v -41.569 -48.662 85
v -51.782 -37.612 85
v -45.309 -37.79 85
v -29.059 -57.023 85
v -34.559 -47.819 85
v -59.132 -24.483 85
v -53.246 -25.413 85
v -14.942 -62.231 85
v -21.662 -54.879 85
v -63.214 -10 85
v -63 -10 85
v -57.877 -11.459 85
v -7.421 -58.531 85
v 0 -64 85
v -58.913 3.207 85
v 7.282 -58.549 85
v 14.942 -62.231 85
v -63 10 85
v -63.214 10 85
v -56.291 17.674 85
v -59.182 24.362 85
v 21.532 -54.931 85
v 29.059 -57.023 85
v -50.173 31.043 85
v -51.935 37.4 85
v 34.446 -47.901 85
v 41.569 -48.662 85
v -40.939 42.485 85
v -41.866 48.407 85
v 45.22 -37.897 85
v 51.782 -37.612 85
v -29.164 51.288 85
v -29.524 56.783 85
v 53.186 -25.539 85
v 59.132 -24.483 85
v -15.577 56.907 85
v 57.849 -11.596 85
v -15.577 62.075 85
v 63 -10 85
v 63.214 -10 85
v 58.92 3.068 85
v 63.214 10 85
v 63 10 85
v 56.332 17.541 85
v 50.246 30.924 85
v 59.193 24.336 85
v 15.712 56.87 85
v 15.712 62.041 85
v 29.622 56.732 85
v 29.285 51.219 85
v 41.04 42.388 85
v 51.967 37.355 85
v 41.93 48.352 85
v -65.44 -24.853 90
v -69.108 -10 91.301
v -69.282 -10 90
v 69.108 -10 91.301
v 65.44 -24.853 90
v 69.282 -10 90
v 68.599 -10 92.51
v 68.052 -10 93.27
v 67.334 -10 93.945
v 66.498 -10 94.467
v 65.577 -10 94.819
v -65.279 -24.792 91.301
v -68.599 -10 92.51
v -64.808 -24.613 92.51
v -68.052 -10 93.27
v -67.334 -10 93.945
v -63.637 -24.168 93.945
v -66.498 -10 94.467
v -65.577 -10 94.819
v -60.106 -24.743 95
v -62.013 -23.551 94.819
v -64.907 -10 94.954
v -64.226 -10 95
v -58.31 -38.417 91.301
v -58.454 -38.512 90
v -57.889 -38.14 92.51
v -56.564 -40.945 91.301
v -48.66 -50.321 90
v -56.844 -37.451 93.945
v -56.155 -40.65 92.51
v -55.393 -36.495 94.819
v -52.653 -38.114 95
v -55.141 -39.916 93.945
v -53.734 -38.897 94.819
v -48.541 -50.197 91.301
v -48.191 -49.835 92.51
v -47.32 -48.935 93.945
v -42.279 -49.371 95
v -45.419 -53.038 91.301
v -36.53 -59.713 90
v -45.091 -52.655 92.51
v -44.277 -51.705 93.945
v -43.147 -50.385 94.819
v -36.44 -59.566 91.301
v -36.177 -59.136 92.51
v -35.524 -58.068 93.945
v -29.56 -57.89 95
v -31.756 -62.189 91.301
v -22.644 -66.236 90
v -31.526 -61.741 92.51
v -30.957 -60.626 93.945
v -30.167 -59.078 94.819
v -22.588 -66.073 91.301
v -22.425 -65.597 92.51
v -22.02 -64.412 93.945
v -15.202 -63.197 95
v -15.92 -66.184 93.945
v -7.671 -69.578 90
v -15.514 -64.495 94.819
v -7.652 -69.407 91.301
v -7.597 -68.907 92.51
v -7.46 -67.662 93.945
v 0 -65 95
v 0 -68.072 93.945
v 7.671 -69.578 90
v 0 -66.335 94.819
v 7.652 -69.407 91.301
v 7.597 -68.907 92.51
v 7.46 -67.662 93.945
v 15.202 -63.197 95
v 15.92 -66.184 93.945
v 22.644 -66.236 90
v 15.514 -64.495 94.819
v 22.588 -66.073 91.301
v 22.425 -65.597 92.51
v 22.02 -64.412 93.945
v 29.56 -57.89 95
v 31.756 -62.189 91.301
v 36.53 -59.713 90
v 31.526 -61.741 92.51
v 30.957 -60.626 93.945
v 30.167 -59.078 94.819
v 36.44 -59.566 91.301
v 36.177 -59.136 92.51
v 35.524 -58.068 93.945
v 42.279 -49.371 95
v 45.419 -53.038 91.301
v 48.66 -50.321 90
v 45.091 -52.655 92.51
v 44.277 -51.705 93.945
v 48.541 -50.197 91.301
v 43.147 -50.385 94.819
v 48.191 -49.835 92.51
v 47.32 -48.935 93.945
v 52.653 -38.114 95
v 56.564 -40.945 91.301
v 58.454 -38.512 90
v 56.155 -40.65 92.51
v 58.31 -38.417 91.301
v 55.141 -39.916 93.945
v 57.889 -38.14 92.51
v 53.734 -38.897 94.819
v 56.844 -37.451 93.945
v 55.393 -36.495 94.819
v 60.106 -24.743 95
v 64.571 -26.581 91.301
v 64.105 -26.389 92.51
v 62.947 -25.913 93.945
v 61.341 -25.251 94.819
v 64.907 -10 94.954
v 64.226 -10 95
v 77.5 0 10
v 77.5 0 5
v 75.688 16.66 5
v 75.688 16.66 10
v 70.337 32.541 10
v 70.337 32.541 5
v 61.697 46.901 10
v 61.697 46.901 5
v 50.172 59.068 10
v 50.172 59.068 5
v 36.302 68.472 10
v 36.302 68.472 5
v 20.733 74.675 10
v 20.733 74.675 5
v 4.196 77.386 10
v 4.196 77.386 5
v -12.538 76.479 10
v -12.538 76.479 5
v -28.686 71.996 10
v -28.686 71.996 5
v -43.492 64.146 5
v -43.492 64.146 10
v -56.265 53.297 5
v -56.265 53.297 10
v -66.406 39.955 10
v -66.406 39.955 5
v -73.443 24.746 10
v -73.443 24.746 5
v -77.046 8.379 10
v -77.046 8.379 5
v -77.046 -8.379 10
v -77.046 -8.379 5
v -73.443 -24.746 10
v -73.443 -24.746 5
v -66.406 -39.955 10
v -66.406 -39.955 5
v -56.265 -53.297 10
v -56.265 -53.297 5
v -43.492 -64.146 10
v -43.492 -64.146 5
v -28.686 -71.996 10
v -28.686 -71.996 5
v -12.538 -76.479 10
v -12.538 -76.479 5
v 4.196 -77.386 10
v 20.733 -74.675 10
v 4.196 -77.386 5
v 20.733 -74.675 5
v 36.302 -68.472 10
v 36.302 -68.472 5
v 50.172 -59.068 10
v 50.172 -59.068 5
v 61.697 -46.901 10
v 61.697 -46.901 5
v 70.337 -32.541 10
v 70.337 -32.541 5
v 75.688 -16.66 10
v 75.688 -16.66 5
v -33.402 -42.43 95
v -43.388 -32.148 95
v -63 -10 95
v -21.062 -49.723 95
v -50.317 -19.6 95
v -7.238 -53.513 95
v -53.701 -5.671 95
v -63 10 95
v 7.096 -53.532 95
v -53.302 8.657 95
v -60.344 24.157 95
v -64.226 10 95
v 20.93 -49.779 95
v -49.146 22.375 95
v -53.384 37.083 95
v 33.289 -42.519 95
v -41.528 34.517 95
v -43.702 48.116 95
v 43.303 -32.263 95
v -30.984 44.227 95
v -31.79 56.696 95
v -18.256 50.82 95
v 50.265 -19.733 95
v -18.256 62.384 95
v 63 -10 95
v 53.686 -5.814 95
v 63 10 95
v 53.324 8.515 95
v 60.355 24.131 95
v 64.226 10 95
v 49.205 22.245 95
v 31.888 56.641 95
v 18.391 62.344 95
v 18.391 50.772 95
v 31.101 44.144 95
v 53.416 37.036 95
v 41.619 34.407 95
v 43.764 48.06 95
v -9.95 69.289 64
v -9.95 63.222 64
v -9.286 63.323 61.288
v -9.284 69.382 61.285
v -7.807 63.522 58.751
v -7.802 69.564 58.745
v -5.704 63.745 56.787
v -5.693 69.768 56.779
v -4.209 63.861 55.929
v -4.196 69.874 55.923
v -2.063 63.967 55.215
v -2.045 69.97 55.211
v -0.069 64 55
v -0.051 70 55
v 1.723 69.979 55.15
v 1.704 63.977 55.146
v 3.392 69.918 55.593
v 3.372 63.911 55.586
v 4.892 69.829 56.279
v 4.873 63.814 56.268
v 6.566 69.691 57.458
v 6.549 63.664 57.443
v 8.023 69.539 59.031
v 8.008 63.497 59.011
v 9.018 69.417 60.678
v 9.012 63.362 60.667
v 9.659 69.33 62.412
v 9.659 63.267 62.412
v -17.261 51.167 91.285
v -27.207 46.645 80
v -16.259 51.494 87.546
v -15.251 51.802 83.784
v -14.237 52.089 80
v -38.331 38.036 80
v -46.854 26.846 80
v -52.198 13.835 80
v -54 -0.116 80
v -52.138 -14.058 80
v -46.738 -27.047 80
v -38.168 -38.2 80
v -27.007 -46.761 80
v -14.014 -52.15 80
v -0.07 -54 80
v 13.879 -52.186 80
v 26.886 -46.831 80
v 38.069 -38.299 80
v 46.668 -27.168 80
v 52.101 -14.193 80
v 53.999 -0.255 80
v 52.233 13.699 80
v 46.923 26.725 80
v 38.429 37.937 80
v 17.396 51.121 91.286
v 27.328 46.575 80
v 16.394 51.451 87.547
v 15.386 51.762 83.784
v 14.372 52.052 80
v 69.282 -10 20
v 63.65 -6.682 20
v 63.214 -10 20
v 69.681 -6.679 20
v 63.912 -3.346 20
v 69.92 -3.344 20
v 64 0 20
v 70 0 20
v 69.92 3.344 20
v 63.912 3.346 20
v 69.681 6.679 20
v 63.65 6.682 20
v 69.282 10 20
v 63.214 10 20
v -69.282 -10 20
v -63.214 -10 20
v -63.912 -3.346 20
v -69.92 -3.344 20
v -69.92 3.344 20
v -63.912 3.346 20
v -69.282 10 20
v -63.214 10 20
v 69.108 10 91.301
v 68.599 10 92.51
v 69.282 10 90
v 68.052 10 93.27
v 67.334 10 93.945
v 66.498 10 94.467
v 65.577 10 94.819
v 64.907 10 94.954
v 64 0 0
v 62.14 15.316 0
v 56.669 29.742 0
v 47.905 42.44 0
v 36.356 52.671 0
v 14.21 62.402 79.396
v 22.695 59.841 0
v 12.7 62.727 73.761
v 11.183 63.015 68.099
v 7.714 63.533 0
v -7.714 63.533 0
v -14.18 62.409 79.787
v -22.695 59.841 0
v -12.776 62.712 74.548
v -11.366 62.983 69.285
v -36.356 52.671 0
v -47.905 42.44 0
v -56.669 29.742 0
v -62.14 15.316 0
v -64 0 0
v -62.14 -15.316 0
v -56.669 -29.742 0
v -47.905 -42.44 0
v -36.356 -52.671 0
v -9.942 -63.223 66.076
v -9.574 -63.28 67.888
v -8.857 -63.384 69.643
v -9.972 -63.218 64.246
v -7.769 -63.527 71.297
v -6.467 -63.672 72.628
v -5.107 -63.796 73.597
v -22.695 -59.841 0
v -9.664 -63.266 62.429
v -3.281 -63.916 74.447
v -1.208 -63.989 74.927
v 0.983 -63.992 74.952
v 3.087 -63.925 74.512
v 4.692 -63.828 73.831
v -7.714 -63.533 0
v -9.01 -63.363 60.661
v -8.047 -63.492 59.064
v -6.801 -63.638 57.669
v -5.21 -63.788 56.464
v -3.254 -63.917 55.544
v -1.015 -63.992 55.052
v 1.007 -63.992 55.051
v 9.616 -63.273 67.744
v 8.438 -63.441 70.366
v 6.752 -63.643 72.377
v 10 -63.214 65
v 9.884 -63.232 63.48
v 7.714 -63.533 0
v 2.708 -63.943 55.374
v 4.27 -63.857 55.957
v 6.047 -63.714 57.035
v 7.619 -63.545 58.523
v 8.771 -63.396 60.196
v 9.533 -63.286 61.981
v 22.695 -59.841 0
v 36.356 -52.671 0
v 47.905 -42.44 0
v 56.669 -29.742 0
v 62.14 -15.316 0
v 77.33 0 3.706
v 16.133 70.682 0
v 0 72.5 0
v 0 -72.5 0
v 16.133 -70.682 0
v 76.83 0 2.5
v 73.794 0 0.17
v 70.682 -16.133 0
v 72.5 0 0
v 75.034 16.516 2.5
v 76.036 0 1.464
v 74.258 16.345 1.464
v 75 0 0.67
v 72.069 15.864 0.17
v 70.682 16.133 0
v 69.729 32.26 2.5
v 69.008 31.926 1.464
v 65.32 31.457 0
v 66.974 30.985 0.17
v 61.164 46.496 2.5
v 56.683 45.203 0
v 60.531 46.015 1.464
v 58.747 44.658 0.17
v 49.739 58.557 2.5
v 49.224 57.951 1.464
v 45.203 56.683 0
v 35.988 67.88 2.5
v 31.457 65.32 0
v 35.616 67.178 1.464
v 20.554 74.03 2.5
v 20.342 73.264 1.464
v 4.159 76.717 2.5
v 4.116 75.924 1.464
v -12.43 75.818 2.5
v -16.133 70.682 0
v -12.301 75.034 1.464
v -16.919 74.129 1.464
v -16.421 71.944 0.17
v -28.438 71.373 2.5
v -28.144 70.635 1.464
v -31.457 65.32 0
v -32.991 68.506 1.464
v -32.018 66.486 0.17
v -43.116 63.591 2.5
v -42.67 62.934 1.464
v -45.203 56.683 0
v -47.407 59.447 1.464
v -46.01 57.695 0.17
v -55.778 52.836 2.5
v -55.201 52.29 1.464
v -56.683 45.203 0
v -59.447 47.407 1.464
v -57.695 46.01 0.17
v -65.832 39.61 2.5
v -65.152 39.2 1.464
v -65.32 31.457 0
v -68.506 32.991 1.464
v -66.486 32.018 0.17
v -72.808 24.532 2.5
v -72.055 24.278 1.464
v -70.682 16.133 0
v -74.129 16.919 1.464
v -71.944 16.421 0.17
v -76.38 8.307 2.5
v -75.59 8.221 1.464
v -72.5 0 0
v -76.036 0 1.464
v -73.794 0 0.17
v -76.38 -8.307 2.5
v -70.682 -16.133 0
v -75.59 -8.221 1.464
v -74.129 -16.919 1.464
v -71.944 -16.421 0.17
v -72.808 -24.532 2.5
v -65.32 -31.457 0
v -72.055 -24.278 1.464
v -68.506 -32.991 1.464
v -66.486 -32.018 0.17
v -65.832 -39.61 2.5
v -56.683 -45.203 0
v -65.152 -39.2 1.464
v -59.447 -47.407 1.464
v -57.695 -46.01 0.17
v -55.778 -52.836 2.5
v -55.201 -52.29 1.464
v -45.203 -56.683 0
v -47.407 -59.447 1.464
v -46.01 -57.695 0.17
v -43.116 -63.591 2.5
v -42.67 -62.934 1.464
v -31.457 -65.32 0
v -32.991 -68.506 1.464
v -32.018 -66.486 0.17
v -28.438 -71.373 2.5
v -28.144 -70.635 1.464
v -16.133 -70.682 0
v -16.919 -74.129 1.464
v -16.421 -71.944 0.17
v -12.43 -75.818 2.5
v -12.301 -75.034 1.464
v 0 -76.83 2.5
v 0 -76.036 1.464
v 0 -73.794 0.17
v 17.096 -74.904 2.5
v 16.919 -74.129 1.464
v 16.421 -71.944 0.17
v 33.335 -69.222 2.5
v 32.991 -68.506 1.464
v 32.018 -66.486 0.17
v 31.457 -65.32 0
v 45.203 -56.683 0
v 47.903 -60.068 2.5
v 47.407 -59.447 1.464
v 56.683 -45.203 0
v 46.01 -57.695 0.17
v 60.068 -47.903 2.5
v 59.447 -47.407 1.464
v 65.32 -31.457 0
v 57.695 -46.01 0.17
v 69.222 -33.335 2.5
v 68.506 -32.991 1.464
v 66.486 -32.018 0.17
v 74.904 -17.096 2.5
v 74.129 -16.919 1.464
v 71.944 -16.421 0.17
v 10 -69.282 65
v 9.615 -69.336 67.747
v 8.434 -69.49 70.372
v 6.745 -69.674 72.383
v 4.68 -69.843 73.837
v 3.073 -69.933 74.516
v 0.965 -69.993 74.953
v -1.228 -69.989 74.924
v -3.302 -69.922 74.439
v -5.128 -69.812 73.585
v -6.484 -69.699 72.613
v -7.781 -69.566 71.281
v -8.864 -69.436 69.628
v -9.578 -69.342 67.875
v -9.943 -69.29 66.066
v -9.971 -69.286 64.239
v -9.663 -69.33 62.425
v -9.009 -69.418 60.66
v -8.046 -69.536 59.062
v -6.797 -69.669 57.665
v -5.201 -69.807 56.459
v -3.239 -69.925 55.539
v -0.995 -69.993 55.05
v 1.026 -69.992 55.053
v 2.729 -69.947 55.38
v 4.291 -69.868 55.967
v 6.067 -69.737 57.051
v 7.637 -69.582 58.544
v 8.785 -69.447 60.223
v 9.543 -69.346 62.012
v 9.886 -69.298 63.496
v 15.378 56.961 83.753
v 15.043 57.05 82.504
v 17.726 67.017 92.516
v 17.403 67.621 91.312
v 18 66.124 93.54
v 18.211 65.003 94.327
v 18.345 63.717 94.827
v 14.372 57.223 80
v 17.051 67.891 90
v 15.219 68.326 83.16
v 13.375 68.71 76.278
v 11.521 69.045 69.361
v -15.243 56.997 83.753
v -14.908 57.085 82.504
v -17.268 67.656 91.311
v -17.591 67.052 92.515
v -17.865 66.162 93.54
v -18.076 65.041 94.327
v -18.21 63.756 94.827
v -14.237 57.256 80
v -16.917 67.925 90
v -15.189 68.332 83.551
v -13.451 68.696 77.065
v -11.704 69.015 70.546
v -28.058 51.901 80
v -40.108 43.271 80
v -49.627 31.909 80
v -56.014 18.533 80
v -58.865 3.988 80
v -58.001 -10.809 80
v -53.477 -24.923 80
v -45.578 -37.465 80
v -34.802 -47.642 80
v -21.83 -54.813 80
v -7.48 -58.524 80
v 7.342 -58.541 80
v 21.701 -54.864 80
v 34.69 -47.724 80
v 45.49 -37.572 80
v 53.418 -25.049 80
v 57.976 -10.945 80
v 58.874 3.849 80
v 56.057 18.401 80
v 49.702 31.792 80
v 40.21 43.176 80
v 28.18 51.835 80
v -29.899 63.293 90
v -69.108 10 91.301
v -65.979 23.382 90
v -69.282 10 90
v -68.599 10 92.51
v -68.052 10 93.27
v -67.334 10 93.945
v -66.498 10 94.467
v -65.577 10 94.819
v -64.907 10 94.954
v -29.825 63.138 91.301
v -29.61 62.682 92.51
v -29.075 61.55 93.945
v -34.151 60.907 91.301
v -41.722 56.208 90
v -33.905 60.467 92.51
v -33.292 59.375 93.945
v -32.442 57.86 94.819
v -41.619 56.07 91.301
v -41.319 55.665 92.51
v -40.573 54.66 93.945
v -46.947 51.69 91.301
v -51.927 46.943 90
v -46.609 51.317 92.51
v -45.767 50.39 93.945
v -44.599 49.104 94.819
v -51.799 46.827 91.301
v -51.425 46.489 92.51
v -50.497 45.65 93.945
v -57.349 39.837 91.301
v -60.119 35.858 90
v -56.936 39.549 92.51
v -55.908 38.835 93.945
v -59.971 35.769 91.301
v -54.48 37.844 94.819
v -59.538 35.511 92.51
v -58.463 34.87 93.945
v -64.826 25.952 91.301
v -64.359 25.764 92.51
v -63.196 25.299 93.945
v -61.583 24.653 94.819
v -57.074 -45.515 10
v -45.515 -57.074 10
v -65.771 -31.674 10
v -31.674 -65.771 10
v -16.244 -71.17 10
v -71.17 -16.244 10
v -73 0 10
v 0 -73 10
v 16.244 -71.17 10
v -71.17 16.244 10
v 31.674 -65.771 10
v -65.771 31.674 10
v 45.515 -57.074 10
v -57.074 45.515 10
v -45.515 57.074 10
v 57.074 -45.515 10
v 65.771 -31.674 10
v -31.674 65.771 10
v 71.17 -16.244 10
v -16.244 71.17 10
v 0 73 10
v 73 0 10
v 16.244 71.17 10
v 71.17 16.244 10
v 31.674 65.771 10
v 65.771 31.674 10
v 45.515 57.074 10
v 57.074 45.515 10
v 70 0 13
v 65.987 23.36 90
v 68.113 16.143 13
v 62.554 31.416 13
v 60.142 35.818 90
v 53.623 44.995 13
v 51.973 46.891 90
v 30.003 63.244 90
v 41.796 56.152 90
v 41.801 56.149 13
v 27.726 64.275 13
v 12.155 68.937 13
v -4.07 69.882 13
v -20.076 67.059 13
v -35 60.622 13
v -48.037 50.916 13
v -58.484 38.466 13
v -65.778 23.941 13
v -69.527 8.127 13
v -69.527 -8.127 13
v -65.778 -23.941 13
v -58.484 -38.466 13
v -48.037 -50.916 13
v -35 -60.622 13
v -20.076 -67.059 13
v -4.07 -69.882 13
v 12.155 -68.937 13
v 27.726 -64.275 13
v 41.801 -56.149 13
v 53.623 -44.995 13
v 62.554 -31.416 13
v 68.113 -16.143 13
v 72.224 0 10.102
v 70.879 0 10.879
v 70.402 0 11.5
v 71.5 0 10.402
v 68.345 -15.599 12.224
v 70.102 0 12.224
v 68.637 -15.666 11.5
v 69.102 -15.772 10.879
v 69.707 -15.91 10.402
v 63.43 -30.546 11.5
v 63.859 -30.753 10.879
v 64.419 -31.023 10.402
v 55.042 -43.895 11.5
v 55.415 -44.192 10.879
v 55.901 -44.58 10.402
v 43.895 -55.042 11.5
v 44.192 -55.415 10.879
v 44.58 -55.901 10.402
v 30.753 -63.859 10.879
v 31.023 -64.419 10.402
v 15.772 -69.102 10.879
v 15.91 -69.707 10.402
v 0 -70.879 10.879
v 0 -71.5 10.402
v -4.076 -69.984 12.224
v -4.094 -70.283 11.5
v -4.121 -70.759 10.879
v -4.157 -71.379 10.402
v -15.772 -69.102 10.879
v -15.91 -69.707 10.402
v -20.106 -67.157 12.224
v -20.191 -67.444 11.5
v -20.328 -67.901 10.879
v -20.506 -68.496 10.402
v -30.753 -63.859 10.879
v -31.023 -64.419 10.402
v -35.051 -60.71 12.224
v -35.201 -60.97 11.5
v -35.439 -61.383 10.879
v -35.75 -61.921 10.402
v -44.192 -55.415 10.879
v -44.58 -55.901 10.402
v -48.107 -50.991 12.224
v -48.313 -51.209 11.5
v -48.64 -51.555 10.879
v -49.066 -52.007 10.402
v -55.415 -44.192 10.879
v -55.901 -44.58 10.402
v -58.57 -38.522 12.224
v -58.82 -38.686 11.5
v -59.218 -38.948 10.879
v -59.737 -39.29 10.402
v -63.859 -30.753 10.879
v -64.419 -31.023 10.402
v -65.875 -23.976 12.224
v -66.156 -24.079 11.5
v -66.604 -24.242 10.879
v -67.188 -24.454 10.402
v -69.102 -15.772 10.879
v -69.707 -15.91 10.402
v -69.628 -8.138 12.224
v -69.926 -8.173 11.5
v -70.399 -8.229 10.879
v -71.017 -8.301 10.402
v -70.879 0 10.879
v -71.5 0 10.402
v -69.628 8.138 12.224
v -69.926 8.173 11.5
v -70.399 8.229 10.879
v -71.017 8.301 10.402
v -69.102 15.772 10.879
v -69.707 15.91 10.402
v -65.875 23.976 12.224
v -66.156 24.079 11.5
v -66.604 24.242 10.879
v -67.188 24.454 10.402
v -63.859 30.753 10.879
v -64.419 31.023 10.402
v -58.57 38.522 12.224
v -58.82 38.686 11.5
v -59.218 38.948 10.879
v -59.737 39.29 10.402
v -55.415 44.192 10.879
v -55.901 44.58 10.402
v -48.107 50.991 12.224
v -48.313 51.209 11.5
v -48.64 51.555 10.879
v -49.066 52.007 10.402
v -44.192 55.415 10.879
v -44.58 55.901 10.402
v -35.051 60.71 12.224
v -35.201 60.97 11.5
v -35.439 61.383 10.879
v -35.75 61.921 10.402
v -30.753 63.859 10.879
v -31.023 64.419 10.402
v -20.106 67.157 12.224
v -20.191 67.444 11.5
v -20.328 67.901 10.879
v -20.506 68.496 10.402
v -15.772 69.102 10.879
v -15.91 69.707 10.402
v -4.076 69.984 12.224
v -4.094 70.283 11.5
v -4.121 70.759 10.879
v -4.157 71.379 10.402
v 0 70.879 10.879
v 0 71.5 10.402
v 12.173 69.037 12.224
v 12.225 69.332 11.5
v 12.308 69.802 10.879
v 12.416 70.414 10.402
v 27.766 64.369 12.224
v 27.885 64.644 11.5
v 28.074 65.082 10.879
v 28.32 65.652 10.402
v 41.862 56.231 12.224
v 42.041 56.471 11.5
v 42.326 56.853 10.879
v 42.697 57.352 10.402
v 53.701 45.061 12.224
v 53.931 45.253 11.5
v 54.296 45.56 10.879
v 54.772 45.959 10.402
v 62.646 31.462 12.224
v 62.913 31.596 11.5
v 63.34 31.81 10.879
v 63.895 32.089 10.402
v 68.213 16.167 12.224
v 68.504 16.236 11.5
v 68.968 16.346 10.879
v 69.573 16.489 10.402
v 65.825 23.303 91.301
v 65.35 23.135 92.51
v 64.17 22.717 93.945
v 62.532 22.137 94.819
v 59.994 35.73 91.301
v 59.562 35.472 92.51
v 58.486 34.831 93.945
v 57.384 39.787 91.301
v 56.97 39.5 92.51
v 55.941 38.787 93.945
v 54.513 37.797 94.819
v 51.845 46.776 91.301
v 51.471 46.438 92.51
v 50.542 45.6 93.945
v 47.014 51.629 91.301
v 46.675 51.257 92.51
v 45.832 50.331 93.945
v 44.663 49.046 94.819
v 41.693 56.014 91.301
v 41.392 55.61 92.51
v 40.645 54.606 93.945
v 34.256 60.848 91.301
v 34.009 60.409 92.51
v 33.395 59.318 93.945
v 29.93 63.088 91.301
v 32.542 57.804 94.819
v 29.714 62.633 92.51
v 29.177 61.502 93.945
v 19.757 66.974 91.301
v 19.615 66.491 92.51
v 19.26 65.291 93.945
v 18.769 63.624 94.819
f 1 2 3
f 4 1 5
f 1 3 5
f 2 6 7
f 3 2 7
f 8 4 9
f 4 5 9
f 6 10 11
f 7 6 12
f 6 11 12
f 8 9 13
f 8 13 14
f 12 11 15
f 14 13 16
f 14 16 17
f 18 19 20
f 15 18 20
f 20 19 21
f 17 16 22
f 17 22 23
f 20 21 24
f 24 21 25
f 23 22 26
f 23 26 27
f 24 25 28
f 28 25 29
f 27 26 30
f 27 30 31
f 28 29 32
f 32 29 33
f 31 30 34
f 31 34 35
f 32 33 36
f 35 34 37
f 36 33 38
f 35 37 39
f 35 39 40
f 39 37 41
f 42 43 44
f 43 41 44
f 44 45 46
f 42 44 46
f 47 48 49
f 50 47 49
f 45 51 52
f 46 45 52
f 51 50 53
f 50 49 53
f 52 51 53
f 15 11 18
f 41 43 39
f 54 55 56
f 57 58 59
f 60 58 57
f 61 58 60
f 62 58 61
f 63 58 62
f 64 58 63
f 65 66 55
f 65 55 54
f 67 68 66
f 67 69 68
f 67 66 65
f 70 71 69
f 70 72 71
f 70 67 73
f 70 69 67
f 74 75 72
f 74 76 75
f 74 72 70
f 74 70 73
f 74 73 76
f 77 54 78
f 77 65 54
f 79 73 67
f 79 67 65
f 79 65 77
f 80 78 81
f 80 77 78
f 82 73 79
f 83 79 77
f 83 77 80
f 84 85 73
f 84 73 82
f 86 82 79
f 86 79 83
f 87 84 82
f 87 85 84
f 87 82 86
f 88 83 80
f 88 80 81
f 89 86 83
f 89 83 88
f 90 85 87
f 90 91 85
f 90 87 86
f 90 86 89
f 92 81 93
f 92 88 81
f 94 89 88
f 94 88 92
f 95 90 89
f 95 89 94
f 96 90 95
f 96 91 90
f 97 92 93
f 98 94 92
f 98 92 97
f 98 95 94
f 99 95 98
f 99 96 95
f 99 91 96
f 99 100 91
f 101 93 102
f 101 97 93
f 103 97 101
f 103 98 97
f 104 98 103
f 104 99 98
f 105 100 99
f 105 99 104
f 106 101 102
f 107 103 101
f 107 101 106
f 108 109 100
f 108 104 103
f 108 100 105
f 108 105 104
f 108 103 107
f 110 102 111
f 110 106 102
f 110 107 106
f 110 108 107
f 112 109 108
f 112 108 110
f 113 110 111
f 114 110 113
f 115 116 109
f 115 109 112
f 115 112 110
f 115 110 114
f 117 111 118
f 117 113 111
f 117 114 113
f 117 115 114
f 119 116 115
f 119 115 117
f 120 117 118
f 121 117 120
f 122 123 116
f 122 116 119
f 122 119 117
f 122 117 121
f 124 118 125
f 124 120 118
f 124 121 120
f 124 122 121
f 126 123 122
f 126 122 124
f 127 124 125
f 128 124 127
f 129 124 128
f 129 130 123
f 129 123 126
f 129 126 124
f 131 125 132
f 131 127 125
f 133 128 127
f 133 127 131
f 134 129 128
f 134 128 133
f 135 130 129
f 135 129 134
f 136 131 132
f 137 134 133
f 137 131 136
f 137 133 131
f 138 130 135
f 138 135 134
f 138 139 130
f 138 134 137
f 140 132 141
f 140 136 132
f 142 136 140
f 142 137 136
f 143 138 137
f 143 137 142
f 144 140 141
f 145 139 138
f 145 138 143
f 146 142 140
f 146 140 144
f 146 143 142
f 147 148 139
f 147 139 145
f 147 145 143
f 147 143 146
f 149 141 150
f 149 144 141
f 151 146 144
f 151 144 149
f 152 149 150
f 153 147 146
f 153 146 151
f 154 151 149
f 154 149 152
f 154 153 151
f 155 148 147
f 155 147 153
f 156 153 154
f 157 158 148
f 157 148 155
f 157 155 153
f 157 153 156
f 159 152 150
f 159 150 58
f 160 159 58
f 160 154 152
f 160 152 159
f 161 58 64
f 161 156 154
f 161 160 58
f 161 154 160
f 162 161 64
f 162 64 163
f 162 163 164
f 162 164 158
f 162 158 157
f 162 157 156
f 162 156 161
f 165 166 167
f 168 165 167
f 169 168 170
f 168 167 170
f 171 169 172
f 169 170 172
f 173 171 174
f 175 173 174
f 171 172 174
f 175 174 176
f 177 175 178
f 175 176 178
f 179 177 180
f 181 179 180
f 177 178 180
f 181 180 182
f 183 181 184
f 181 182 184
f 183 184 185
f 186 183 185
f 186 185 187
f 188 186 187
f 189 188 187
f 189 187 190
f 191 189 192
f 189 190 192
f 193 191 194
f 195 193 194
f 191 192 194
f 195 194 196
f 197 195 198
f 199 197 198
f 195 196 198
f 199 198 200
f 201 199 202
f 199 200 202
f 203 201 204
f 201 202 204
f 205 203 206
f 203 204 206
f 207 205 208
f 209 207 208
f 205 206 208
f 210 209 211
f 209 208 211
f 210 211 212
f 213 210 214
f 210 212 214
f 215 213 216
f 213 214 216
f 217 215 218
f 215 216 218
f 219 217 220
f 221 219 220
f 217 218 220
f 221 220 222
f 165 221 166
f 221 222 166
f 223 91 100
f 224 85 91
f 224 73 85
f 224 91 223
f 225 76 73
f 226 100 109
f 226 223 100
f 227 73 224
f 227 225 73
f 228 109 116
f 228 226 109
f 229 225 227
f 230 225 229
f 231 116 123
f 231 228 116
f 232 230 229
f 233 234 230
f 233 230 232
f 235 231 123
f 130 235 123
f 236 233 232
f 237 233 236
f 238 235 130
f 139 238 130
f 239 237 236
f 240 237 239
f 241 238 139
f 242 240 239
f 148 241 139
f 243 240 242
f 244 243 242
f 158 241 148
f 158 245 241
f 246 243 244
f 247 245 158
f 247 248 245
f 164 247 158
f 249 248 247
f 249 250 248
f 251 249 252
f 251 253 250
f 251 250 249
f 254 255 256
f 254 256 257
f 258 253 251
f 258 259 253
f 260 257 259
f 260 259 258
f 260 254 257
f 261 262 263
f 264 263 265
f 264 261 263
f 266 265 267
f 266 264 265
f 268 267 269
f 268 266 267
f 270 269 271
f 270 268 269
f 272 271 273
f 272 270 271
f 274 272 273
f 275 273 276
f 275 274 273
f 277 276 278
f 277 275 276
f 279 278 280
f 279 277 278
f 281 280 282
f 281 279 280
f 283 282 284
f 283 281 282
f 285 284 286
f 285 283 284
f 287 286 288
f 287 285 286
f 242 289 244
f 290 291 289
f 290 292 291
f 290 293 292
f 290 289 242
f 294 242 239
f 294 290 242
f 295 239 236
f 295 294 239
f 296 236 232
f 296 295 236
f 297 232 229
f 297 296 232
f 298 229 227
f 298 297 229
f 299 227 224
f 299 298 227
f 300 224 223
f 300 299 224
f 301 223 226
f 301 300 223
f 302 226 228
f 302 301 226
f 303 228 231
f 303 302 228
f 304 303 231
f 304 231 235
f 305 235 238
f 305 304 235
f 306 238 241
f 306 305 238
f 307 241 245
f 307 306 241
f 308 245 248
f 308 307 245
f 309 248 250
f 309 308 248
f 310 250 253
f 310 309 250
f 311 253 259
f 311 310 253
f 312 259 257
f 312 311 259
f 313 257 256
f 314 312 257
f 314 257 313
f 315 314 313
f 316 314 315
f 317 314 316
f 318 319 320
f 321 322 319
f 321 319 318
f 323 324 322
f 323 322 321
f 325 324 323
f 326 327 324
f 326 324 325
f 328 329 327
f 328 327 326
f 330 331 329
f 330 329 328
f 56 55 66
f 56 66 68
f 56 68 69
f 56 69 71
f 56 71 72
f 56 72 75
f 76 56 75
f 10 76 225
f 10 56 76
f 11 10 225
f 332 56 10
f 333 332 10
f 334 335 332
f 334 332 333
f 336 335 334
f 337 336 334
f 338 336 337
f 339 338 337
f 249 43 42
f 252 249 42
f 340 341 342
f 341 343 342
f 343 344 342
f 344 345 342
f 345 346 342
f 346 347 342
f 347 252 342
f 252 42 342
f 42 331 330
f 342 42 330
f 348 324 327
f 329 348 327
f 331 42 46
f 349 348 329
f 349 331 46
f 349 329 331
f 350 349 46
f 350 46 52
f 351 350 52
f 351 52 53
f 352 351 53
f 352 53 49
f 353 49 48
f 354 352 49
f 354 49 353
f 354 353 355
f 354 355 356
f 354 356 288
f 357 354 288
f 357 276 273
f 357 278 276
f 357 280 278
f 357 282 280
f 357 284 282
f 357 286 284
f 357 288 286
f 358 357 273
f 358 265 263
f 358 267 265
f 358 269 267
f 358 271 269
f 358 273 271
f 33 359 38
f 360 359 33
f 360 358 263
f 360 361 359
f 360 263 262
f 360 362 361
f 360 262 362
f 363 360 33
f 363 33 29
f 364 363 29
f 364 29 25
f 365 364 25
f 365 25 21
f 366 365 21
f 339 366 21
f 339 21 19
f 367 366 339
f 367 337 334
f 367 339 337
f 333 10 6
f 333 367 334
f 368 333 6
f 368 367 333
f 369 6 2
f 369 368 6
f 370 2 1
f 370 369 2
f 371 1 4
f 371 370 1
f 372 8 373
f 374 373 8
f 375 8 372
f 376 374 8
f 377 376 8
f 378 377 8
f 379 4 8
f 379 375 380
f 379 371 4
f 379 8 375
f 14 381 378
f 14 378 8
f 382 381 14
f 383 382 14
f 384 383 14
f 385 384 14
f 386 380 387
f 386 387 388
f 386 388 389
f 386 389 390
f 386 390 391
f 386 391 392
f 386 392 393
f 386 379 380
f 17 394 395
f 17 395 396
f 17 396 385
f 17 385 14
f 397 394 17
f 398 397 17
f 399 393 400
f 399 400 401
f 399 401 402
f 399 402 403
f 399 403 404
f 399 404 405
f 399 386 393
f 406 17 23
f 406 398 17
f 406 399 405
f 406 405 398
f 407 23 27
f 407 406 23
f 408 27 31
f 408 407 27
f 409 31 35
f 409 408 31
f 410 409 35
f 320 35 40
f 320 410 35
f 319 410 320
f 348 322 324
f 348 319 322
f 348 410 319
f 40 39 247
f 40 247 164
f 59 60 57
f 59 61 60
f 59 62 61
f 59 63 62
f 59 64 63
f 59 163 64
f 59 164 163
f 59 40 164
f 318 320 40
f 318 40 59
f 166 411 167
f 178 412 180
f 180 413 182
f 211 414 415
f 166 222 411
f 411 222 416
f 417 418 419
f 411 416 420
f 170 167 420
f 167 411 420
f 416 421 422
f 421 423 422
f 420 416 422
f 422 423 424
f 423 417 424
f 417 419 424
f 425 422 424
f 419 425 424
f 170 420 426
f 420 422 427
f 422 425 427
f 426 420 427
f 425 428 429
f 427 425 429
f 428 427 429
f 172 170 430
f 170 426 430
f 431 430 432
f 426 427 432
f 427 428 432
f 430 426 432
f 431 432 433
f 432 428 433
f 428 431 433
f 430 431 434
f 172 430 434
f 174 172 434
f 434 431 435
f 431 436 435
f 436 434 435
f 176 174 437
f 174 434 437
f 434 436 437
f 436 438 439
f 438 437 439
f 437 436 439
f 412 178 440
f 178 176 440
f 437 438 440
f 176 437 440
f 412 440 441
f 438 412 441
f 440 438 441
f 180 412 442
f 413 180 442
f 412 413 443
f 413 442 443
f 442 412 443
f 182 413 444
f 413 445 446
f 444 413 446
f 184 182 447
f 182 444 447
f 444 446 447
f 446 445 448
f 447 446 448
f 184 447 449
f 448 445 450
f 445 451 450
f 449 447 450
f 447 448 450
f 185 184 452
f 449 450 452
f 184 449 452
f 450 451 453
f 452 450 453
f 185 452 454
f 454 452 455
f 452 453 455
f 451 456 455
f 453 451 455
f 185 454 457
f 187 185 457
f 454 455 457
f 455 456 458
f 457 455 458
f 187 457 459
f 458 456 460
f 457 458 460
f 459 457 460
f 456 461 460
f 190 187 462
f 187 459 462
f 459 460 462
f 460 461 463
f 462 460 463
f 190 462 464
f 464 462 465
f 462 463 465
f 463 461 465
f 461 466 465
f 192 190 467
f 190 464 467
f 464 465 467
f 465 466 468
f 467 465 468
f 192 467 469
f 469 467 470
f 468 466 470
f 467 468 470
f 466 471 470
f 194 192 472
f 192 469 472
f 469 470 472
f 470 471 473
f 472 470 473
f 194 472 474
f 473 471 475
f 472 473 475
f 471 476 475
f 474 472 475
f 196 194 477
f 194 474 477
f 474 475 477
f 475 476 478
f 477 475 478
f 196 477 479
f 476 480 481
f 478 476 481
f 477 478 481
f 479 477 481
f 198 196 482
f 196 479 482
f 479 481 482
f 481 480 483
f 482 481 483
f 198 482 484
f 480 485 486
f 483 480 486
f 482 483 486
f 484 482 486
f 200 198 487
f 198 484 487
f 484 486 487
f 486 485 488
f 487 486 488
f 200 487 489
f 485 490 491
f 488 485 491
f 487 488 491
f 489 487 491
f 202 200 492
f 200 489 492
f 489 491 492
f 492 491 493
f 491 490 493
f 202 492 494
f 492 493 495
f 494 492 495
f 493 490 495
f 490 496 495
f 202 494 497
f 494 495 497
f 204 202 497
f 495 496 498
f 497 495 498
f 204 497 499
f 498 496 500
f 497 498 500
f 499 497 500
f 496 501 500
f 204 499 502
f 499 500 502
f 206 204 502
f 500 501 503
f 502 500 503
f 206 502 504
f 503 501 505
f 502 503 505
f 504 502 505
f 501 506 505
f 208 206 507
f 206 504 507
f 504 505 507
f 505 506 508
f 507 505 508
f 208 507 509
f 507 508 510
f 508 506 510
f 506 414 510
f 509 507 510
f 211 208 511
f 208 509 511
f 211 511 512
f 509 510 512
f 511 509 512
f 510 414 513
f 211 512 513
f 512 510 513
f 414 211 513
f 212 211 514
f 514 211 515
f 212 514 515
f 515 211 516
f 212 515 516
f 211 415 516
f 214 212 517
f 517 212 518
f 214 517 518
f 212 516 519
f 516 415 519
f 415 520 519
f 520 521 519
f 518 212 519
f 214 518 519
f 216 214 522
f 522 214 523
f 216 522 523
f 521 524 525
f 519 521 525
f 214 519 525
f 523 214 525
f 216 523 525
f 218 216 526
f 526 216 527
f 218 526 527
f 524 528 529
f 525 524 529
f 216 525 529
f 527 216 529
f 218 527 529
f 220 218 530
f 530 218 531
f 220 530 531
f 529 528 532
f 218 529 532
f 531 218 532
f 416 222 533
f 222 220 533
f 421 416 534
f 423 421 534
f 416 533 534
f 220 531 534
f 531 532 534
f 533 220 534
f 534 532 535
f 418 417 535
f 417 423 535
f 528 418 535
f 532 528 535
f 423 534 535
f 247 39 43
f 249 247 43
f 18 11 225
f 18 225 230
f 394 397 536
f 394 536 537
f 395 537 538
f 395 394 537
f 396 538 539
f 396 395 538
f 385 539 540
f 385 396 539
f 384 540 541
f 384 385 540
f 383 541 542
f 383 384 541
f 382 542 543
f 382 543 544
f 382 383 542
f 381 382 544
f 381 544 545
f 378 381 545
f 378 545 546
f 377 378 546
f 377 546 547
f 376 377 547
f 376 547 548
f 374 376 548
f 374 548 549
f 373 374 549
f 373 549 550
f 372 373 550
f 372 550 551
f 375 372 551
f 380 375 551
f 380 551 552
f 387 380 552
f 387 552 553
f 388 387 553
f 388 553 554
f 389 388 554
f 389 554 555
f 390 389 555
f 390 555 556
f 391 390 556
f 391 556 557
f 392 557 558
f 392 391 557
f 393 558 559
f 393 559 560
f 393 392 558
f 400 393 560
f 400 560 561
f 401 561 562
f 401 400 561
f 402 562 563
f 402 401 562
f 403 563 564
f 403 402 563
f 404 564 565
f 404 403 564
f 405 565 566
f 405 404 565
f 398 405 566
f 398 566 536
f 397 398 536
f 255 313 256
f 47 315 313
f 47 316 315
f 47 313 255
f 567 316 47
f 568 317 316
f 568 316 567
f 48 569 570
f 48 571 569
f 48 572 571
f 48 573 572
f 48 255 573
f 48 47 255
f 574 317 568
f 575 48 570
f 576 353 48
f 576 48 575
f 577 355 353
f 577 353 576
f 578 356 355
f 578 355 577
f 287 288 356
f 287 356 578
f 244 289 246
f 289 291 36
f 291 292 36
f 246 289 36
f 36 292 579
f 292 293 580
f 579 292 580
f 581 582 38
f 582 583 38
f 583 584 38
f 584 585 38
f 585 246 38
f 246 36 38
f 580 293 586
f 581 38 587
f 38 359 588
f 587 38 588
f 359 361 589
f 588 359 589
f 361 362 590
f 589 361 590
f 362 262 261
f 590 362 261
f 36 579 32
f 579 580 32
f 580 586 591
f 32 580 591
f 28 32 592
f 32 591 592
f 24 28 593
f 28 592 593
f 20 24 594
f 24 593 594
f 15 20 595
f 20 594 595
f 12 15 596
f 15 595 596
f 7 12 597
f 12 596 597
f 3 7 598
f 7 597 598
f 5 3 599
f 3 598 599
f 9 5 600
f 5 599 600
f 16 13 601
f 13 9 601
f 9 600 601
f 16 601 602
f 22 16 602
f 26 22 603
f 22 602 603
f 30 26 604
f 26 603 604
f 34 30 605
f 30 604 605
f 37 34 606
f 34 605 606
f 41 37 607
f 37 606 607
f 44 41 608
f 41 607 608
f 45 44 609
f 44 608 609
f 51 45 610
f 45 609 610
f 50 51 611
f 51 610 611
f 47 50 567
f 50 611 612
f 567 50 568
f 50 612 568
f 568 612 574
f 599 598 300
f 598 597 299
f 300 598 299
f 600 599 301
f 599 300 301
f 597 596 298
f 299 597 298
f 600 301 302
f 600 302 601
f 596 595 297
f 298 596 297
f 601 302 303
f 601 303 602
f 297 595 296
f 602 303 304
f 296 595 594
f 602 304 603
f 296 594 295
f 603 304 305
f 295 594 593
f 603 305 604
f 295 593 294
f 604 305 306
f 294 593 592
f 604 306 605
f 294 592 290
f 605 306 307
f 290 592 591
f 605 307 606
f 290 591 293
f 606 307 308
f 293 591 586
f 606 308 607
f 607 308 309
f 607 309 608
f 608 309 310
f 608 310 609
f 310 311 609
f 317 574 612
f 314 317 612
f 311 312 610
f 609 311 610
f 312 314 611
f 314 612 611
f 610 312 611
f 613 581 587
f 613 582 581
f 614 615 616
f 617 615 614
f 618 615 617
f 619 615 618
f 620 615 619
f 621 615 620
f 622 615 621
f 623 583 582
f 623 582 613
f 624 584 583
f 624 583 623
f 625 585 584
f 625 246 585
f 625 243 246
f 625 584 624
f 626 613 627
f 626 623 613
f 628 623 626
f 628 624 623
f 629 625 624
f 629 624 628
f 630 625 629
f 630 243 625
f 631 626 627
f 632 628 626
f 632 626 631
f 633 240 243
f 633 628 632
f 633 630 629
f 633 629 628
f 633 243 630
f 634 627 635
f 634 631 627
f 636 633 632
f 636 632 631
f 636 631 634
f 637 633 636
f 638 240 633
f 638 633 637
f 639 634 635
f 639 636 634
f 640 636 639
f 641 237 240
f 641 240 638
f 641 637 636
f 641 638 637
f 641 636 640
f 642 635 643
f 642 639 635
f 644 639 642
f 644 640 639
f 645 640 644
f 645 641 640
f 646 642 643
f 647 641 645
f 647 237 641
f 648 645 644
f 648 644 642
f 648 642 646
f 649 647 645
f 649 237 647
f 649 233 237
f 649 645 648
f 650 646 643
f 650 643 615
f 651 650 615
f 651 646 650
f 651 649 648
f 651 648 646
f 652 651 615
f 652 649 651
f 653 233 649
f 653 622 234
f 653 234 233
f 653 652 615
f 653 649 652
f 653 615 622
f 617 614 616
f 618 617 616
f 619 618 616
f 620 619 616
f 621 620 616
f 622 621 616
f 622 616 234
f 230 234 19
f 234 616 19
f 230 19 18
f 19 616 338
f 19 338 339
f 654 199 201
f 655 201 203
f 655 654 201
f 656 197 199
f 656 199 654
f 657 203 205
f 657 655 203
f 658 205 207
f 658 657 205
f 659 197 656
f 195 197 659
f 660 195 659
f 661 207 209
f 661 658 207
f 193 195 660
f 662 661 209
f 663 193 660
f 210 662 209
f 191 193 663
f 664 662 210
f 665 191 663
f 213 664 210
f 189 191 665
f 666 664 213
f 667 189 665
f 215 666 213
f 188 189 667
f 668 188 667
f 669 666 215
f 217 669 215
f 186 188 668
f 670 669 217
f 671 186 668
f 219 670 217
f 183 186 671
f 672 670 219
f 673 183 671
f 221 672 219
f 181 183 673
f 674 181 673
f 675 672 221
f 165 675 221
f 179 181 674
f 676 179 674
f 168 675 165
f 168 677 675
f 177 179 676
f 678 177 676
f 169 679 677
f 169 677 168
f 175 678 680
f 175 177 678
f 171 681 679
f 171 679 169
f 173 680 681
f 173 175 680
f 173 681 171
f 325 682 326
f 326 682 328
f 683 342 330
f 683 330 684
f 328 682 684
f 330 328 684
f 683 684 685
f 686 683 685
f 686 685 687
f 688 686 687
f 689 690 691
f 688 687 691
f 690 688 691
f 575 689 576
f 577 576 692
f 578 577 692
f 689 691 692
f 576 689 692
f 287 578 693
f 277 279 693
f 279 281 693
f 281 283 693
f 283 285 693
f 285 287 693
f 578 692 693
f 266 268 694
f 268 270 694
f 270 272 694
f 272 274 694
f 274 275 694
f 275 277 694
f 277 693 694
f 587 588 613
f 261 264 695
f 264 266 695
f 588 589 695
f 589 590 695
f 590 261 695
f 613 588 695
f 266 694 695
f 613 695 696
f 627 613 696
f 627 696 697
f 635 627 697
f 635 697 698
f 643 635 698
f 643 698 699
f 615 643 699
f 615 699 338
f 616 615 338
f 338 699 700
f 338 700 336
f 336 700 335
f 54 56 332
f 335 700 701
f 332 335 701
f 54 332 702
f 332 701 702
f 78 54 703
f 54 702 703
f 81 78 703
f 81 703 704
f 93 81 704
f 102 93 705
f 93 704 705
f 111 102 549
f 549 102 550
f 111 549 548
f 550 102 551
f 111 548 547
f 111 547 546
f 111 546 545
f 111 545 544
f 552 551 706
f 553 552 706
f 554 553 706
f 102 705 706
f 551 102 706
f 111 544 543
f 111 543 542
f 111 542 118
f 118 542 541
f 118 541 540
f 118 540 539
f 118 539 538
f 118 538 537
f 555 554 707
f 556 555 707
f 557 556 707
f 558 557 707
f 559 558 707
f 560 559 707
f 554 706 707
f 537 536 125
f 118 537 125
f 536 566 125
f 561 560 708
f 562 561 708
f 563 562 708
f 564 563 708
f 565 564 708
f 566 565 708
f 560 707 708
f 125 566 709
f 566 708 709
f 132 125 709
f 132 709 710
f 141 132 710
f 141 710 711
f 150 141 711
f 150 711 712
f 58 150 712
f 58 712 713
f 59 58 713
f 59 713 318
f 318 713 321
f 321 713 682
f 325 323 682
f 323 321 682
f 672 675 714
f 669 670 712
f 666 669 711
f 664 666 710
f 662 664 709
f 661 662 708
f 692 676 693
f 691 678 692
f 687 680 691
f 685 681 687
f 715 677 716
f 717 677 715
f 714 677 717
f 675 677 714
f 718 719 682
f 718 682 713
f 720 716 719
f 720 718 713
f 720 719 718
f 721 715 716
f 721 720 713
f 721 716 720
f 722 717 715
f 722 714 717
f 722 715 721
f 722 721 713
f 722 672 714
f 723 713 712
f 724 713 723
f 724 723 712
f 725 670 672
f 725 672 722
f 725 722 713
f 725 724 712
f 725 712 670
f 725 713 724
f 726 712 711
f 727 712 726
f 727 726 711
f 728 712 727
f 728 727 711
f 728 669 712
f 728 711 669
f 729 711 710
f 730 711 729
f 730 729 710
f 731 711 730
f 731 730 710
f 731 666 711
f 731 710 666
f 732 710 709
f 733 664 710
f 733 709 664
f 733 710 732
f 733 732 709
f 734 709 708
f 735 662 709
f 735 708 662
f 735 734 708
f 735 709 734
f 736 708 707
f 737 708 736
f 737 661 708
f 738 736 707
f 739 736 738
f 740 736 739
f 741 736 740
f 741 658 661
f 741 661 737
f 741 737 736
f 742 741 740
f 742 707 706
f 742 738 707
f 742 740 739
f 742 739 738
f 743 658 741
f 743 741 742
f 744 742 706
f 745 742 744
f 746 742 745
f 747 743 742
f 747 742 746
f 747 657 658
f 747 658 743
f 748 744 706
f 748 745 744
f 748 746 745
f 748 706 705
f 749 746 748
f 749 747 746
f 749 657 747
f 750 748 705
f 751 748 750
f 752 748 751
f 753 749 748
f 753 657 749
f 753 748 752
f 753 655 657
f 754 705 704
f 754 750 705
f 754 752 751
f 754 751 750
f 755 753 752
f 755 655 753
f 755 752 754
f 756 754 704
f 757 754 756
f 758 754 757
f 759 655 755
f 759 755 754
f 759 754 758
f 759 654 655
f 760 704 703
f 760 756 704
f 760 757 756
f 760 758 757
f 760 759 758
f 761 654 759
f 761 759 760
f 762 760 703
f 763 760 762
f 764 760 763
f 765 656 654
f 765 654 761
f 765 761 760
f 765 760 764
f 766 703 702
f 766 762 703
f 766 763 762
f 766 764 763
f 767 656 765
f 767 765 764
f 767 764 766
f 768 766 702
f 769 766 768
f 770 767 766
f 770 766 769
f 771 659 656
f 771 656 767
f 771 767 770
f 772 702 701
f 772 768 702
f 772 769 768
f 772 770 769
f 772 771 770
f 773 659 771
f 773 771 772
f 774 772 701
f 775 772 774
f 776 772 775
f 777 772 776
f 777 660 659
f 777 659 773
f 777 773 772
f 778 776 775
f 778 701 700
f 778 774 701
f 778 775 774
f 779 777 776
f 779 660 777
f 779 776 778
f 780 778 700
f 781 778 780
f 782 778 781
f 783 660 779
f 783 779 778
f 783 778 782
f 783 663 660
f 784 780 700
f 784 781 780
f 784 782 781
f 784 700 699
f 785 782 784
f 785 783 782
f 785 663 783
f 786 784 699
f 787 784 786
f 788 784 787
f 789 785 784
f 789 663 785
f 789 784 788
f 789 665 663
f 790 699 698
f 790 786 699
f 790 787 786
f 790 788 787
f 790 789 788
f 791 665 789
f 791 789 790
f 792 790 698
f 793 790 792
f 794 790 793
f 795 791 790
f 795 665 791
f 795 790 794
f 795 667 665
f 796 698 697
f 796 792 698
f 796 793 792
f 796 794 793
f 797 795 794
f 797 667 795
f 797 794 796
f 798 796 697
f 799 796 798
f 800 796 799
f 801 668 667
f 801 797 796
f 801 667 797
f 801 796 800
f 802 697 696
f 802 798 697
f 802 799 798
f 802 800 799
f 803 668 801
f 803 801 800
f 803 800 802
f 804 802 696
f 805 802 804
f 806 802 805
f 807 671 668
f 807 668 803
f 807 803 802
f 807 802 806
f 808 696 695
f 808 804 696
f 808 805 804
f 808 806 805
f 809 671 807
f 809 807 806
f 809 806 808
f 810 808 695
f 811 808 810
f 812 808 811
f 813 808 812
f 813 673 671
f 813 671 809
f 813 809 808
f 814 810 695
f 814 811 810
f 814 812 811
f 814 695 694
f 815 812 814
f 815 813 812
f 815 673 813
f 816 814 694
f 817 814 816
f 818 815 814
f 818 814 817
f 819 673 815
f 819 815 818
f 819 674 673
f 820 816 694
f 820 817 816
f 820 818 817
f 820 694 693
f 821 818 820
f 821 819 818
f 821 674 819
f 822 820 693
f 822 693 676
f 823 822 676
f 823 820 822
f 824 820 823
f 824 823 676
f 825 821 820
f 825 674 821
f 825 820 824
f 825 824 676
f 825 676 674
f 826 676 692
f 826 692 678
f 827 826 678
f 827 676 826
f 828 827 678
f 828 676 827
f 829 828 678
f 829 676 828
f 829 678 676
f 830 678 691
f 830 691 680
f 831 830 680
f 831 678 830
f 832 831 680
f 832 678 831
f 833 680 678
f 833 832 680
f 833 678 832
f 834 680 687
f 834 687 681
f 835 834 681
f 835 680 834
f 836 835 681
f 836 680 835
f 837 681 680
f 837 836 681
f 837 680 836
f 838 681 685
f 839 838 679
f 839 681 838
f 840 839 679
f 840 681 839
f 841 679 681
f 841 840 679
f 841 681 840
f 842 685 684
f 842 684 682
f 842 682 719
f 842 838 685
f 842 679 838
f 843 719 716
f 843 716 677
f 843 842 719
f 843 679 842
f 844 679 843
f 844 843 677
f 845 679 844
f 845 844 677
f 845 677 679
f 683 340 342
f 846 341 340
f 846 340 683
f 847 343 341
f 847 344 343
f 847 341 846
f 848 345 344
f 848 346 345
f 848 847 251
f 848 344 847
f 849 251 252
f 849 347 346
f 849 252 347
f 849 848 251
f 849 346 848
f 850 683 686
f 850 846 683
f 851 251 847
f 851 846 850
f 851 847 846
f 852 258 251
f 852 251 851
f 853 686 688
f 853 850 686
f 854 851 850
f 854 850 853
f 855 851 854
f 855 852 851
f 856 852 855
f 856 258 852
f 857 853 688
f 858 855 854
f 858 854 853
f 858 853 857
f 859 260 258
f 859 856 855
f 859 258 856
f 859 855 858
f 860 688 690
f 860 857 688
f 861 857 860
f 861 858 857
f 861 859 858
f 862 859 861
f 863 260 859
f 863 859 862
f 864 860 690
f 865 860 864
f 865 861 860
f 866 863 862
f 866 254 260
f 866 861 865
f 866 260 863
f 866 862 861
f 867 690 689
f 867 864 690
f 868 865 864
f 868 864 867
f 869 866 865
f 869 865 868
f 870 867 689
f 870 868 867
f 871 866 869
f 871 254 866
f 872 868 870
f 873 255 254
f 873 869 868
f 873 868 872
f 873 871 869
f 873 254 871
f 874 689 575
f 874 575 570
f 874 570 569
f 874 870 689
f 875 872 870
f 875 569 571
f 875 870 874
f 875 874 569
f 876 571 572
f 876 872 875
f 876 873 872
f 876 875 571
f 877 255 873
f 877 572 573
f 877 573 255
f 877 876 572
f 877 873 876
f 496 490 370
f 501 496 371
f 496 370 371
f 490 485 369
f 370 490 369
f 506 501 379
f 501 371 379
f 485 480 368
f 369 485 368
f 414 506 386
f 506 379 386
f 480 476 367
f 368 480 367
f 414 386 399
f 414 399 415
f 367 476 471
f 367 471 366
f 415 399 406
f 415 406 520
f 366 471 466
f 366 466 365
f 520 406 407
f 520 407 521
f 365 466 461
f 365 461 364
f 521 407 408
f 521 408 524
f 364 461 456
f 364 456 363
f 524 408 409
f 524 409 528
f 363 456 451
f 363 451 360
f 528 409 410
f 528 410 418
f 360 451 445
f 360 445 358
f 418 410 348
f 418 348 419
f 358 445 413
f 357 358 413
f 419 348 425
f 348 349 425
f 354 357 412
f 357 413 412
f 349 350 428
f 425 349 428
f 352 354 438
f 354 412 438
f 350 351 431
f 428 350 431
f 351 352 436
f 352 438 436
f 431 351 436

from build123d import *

# Parameters (mm, degrees)
BOX004_W               = 20
BOX004_H               = 20
BOX004_DEPTH           = 80
BOX003_W               = 20
BOX003_H               = 20
BOX003_DEPTH           = 80
BOX002_W               = 10
BOX002_H               = 25
BOX002_DEPTH           = 35
BOX002_PITCH_ANGLE     = -15
BOX001_W               = 10
BOX001_H               = 25
BOX001_DEPTH           = 35
BOX001_PITCH_ANGLE     = 15
BOX_W                  = 20
BOX_H                  = 25
BOX_DEPTH              = 35
CYLINDER005_R          = 10
CYLINDER005_DEPTH      = 180
CYLINDER005_ROLL_ANGLE = 90
CYLINDER004_R          = 54
CYLINDER004_DEPTH      = 100
CYLINDER003_R          = 59
CYLINDER003_DEPTH      = 10
CYLINDER002_R          = 64
CYLINDER002_DEPTH      = 85
CYLINDER001_R          = 70
CYLINDER001_DEPTH      = 90
CYLINDER_R             = 77.5
CYLINDER_DEPTH         = 10
FILLET_R               = 3
FILLET001_R            = 5
FILLET002_R            = 5


with BuildPart() as tab_cut_l:
    # Box004 → Box004 (new body)
    with BuildSketch(Plane(origin=(-83, -10, 20), x_dir=(1, 0, 0), z_dir=(0, 0, 1))):
        with Locations((10, 10)):
            Rectangle(BOX004_W, BOX004_H)
    extrude(amount=BOX004_DEPTH)


with BuildPart() as tab_cut_r:
    # Box003 → Box003 (new body)
    with BuildSketch(Plane(origin=(63, -10, 20), x_dir=(1, 0, 0), z_dir=(0, 0, 1))):
        with Locations((10, 10)):
            Rectangle(BOX003_W, BOX003_H)
    extrude(amount=BOX003_DEPTH)


with BuildPart() as cube001:
    # Box002 → Box002 (new body)
    with BuildSketch(Plane.XY):
        with Locations((5, 12.5)):
            Rectangle(BOX002_W, BOX002_H)
    extrude(amount=BOX002_DEPTH)


with BuildPart() as cube001_1:
    # Box002 pitch: moved
    add(cube001.part.rotate(Axis((0, 0, 0), (0, 1, 0)), BOX002_PITCH_ANGLE))


with BuildPart() as cube001_2:
    # Box002 placement: moved
    add(cube001_1.part.moved(Location((-9.95, 48, 64))))


with BuildPart() as cube:
    # Box001 → Box001 (new body)
    with BuildSketch(Plane.XY):
        with Locations((5, 12.5)):
            Rectangle(BOX001_W, BOX001_H)
    extrude(amount=BOX001_DEPTH)


with BuildPart() as cube_1:
    # Box001 pitch: moved
    add(cube.part.rotate(Axis((0, 0, 0), (0, 1, 0)), BOX001_PITCH_ANGLE))


with BuildPart() as cube_2:
    # Box001 placement: moved
    add(cube_1.part.moved(Location((0, 48, 65))))


with BuildPart() as bearing_slot:
    # Box → Box (new body)
    with BuildSketch(Plane(origin=(-10, 48, 65), x_dir=(1, 0, 0), z_dir=(0, 0, 1))):
        with Locations((10, 12.5)):
            Rectangle(BOX_W, BOX_H)
    extrude(amount=BOX_DEPTH)


with BuildPart() as bearing_holes:
    # Cylinder005 → Cylinder005 (new body)
    with BuildSketch(Plane.XY):
        Circle(CYLINDER005_R)
    extrude(amount=CYLINDER005_DEPTH)


with BuildPart() as bearing_holes_1:
    # Cylinder005 roll: moved
    add(bearing_holes.part.rotate(Axis((0, 0, 0), (1, 0, 0)), CYLINDER005_ROLL_ANGLE))


with BuildPart() as bearing_holes_2:
    # Cylinder005 placement: moved
    add(bearing_holes_1.part.moved(Location((0, 90, 65))))


with BuildPart() as through_hole:
    # Cylinder004 → Cylinder004 (new body)
    with BuildSketch(Plane.XY):
        Circle(CYLINDER004_R)
    extrude(amount=CYLINDER004_DEPTH)


with BuildPart() as inner_lip:
    # Cylinder003 → Cylinder003 (new body)
    with BuildSketch(Plane.XY.offset(80)):
        Circle(CYLINDER003_R)
    extrude(amount=CYLINDER003_DEPTH)


with BuildPart() as inner_hole:
    # Cylinder002 → Cylinder002 (new body)
    with BuildSketch(Plane.XY):
        Circle(CYLINDER002_R)
    extrude(amount=CYLINDER002_DEPTH)


with BuildPart() as body_cylinder:
    # Cylinder001 → Cylinder001 (new body)
    with BuildSketch(Plane.XY.offset(5)):
        Circle(CYLINDER001_R)
    extrude(amount=CYLINDER001_DEPTH)


with BuildPart() as cut007:
    # Cylinder → Cylinder (new body)
    with BuildSketch(Plane.XY):
        Circle(CYLINDER_R)
    extrude(amount=CYLINDER_DEPTH)

    # Fusion: union Body_Cylinder
    add(body_cylinder.part)

    # Cut: cut Inner_Hole
    add(inner_hole.part, mode=Mode.SUBTRACT)

    # Fusion001: union Inner_Lip
    add(inner_lip.part)

    # Cut001: cut Through_Hole
    add(through_hole.part, mode=Mode.SUBTRACT)

    # Fillet
    fillet_edges = [cut007.edges().sort_by_distance(p)[0] for p in [
        (-70, 0, 10),
    ]]
    fillet(fillet_edges, radius=FILLET_R)

    # Fillet001
    fillet001_edges = [cut007.edges().sort_by_distance(p)[0] for p in [
        (-77.5, 0, 0),
    ]]
    fillet(fillet001_edges, radius=FILLET001_R)

    # Fillet002
    fillet002_edges = [cut007.edges().sort_by_distance(p)[0] for p in [
        (-70, 0, 95),
    ]]
    fillet(fillet002_edges, radius=FILLET002_R)

    # Cut002: cut Bearing_Holes
    add(bearing_holes_2.part, mode=Mode.SUBTRACT)

    # Cut003: cut Bearing_Slot
    add(bearing_slot.part, mode=Mode.SUBTRACT)

    # Cut004: cut Cube
    add(cube_2.part, mode=Mode.SUBTRACT)

    # Cut005: cut Cube001
    add(cube001_2.part, mode=Mode.SUBTRACT)

    # Cut006: cut Tab_Cut_R
    add(tab_cut_r.part, mode=Mode.SUBTRACT)

    # Cut007: cut Tab_Cut_L
    add(tab_cut_l.part, mode=Mode.SUBTRACT)


solid = cut007.part
